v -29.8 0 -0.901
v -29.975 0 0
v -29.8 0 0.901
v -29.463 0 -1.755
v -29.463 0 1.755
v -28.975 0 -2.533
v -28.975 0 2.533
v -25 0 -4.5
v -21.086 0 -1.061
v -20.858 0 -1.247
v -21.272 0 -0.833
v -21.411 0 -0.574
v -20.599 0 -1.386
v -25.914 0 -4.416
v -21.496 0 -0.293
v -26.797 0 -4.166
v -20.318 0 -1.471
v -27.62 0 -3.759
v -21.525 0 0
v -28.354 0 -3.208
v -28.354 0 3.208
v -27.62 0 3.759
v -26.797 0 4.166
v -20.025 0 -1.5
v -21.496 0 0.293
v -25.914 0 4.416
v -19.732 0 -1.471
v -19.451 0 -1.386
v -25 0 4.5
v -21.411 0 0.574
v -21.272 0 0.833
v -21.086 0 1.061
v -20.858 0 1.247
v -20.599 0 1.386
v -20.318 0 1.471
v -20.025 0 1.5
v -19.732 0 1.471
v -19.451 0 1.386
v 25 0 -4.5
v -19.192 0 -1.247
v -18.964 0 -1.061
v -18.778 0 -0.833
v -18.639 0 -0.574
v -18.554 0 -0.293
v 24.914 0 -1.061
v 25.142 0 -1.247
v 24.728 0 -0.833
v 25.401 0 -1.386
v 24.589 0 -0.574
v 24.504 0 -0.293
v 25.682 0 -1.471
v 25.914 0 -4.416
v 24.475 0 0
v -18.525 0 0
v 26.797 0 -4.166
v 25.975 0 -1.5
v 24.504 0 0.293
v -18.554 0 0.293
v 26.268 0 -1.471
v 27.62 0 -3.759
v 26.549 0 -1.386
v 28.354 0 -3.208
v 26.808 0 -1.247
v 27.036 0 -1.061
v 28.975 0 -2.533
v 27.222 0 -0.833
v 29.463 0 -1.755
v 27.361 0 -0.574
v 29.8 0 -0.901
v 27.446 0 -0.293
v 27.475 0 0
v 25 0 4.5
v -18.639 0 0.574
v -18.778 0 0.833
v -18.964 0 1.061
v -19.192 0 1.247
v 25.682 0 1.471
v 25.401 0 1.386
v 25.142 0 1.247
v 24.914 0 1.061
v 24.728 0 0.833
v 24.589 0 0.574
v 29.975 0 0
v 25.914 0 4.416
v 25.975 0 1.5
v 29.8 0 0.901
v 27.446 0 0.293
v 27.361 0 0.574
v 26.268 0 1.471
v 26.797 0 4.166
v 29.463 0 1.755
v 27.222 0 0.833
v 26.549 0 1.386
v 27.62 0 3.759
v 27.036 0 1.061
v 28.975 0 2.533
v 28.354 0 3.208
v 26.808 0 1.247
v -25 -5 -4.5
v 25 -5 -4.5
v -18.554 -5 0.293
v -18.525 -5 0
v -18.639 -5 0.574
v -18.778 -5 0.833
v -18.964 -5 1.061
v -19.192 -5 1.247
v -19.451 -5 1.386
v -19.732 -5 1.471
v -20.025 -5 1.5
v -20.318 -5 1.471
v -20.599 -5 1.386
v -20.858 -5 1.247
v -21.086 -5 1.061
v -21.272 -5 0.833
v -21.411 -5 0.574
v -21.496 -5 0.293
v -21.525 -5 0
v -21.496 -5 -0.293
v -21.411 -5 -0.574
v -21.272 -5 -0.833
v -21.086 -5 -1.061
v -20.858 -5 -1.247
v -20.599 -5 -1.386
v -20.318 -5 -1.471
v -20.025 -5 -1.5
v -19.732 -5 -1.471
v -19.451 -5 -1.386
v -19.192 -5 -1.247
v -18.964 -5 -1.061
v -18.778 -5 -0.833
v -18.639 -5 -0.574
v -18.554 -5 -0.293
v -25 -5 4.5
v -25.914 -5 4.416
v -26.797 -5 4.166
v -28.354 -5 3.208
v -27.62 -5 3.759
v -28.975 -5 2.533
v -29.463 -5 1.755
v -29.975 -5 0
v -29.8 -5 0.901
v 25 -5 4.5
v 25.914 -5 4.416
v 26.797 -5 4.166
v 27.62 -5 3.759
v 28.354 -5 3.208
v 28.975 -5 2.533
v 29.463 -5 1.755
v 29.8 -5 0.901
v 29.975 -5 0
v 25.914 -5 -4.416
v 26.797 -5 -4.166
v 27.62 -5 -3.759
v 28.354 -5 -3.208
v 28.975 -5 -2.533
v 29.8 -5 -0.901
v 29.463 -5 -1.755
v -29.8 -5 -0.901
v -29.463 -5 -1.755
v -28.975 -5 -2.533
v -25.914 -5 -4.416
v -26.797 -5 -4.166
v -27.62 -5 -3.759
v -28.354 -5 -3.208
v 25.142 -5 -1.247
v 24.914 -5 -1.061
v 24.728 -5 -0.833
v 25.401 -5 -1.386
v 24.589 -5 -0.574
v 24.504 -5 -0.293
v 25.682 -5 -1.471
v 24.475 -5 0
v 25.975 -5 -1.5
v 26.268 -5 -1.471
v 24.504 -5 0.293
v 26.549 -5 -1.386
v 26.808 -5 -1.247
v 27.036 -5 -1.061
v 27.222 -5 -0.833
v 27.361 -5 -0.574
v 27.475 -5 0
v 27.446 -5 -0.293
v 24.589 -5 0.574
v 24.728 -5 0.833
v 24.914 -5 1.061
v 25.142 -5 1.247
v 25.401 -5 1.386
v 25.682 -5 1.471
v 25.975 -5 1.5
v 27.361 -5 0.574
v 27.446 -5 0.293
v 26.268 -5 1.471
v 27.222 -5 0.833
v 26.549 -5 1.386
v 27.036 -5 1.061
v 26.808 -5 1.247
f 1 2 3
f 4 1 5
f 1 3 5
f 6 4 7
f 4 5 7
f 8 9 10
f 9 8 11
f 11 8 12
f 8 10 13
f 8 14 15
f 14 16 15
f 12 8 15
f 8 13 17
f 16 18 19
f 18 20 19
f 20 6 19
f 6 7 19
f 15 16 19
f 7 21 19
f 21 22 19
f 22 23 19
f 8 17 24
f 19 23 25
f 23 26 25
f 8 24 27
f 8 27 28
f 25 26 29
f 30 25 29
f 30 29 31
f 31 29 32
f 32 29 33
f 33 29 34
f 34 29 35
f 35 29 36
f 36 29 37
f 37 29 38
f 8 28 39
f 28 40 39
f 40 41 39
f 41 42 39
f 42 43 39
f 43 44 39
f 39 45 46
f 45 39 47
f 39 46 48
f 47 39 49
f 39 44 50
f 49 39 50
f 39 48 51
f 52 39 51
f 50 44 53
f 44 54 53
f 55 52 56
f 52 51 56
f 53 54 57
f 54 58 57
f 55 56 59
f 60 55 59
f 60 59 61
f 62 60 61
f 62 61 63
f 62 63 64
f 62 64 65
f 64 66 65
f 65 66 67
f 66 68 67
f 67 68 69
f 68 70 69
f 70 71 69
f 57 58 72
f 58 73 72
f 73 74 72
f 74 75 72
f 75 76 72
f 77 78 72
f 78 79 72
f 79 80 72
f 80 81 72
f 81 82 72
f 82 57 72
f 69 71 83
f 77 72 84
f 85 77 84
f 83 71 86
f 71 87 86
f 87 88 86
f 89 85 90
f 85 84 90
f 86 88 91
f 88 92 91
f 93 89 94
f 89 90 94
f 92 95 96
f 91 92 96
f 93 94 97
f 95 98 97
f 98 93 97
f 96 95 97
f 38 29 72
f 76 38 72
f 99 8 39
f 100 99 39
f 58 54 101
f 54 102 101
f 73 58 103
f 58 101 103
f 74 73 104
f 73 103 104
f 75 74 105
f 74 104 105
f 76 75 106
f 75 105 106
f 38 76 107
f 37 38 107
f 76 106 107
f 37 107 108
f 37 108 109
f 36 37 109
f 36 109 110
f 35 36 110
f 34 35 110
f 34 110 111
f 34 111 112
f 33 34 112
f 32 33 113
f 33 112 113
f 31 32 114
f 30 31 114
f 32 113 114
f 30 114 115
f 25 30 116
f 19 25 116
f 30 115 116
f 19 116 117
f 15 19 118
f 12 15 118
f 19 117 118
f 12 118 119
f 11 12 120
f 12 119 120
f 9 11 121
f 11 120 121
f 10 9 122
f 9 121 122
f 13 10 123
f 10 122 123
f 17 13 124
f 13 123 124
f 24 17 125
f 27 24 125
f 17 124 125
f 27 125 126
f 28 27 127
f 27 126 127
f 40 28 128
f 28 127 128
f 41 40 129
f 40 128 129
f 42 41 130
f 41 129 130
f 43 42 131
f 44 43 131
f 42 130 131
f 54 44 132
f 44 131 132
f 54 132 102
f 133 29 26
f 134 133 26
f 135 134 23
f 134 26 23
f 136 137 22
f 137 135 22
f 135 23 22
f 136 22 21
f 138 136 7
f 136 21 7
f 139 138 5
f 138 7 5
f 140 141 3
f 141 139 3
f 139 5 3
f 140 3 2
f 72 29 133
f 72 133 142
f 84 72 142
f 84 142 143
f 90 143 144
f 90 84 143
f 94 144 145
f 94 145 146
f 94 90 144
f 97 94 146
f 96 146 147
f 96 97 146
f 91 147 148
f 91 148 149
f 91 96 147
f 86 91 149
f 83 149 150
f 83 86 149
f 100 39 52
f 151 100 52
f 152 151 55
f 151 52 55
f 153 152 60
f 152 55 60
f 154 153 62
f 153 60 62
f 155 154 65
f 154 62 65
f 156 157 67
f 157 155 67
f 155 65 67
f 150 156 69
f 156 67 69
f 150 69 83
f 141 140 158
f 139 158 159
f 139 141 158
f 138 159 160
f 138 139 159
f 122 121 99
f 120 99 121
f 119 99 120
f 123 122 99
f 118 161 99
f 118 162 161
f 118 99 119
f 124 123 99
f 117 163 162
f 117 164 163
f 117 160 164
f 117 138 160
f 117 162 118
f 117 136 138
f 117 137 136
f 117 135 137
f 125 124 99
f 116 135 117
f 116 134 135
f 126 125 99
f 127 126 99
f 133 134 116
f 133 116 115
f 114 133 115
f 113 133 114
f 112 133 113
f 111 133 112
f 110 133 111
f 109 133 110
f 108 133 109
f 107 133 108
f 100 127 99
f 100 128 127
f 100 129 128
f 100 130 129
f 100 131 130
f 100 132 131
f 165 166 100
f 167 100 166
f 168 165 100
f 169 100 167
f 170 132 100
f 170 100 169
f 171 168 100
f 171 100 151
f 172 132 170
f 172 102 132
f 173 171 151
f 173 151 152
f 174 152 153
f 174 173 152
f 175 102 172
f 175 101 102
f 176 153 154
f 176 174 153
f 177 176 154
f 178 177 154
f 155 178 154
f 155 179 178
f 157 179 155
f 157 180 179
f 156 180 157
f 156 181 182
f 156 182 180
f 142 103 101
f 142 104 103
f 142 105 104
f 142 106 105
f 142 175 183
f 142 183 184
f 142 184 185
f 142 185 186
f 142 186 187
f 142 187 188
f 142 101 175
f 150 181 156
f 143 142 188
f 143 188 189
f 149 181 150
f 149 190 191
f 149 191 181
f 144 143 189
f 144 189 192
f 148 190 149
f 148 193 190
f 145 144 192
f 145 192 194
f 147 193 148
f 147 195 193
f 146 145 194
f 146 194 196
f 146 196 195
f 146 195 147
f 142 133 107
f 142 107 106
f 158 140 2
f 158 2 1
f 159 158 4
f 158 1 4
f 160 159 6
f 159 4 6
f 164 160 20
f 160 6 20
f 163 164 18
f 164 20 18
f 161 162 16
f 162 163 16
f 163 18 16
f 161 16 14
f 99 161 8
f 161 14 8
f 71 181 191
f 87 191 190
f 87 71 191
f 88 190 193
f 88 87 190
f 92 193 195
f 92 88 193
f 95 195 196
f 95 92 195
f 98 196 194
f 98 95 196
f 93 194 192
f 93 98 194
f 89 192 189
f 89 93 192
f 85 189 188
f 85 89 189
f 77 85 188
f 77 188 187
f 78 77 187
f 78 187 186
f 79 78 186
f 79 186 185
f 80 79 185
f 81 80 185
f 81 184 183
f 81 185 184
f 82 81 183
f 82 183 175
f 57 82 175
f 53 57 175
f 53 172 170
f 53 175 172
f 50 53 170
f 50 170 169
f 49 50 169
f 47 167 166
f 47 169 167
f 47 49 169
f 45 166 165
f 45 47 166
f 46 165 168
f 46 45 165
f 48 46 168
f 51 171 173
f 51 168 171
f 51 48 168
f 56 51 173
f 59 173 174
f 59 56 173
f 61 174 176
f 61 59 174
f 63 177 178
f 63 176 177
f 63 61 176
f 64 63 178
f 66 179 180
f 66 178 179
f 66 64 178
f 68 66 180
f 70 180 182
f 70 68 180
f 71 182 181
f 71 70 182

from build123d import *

# Parameters (mm, degrees)
F0_W        = 60
F0_H        = 9
F1_DEPTH    = 5
F2_T1_DEPTH = 30
F3_R        = 1.5
F4_DEPTH    = 12.5


# Not quite as in the source:
# - a fillet or chamfer that OpenCascade refuses, or shapes differently, is made with other operations: its cross-section is extruded or revolved along the edge and cut away or added


with BuildPart() as f1:
    # F0 (on Front) → F1 (new body)
    with BuildSketch(Plane.XZ):
        Rectangle(F0_W, F0_H)
    extrude(amount=F1_DEPTH)

    # F2: fillet of radius 5 on 4 edges, made by hand

    # F2_s2 → F2_t1 (cut)
    with BuildSketch(Plane.XZ.offset(-12.5)):
        with BuildLine():
            ThreePointArc((-25, 4.5), (-28.5355339059, 3.0355339059), (-30, -0.5))
            Line((-30, -0.5), (-30, 4.5))
            Line((-30, 4.5), (-25, 4.5))
        make_face()
        with BuildLine():
            ThreePointArc((-30, 0.5), (-28.5355339059, -3.0355339059), (-25, -4.5))
            Line((-25, -4.5), (-30, -4.5))
            Line((-30, -4.5), (-30, 0.5))
        make_face()
        with BuildLine():
            ThreePointArc((25, 4.5), (28.5355339059, 3.0355339059), (30, -0.5))
            Line((30, -0.5), (30, 4.5))
            Line((30, 4.5), (25, 4.5))
        make_face()
        with BuildLine():
            ThreePointArc((25, -4.5), (28.5355339059, -3.0355339059), (30, 0.5))
            Line((30, 0.5), (30, -4.5))
            Line((30, -4.5), (25, -4.5))
        make_face()
    extrude(amount=F2_T1_DEPTH, mode=Mode.SUBTRACT)

    # F3 (on Front) → F4 (cut, symmetric)
    with BuildSketch(Plane.XZ):
        with Locations((25.9749371855, 0)):
            Circle(F3_R)
        with Locations((-20.0250628145, 0)):
            Circle(F3_R)
    extrude(amount=F4_DEPTH, both=True, mode=Mode.SUBTRACT)


solid = f1.part
